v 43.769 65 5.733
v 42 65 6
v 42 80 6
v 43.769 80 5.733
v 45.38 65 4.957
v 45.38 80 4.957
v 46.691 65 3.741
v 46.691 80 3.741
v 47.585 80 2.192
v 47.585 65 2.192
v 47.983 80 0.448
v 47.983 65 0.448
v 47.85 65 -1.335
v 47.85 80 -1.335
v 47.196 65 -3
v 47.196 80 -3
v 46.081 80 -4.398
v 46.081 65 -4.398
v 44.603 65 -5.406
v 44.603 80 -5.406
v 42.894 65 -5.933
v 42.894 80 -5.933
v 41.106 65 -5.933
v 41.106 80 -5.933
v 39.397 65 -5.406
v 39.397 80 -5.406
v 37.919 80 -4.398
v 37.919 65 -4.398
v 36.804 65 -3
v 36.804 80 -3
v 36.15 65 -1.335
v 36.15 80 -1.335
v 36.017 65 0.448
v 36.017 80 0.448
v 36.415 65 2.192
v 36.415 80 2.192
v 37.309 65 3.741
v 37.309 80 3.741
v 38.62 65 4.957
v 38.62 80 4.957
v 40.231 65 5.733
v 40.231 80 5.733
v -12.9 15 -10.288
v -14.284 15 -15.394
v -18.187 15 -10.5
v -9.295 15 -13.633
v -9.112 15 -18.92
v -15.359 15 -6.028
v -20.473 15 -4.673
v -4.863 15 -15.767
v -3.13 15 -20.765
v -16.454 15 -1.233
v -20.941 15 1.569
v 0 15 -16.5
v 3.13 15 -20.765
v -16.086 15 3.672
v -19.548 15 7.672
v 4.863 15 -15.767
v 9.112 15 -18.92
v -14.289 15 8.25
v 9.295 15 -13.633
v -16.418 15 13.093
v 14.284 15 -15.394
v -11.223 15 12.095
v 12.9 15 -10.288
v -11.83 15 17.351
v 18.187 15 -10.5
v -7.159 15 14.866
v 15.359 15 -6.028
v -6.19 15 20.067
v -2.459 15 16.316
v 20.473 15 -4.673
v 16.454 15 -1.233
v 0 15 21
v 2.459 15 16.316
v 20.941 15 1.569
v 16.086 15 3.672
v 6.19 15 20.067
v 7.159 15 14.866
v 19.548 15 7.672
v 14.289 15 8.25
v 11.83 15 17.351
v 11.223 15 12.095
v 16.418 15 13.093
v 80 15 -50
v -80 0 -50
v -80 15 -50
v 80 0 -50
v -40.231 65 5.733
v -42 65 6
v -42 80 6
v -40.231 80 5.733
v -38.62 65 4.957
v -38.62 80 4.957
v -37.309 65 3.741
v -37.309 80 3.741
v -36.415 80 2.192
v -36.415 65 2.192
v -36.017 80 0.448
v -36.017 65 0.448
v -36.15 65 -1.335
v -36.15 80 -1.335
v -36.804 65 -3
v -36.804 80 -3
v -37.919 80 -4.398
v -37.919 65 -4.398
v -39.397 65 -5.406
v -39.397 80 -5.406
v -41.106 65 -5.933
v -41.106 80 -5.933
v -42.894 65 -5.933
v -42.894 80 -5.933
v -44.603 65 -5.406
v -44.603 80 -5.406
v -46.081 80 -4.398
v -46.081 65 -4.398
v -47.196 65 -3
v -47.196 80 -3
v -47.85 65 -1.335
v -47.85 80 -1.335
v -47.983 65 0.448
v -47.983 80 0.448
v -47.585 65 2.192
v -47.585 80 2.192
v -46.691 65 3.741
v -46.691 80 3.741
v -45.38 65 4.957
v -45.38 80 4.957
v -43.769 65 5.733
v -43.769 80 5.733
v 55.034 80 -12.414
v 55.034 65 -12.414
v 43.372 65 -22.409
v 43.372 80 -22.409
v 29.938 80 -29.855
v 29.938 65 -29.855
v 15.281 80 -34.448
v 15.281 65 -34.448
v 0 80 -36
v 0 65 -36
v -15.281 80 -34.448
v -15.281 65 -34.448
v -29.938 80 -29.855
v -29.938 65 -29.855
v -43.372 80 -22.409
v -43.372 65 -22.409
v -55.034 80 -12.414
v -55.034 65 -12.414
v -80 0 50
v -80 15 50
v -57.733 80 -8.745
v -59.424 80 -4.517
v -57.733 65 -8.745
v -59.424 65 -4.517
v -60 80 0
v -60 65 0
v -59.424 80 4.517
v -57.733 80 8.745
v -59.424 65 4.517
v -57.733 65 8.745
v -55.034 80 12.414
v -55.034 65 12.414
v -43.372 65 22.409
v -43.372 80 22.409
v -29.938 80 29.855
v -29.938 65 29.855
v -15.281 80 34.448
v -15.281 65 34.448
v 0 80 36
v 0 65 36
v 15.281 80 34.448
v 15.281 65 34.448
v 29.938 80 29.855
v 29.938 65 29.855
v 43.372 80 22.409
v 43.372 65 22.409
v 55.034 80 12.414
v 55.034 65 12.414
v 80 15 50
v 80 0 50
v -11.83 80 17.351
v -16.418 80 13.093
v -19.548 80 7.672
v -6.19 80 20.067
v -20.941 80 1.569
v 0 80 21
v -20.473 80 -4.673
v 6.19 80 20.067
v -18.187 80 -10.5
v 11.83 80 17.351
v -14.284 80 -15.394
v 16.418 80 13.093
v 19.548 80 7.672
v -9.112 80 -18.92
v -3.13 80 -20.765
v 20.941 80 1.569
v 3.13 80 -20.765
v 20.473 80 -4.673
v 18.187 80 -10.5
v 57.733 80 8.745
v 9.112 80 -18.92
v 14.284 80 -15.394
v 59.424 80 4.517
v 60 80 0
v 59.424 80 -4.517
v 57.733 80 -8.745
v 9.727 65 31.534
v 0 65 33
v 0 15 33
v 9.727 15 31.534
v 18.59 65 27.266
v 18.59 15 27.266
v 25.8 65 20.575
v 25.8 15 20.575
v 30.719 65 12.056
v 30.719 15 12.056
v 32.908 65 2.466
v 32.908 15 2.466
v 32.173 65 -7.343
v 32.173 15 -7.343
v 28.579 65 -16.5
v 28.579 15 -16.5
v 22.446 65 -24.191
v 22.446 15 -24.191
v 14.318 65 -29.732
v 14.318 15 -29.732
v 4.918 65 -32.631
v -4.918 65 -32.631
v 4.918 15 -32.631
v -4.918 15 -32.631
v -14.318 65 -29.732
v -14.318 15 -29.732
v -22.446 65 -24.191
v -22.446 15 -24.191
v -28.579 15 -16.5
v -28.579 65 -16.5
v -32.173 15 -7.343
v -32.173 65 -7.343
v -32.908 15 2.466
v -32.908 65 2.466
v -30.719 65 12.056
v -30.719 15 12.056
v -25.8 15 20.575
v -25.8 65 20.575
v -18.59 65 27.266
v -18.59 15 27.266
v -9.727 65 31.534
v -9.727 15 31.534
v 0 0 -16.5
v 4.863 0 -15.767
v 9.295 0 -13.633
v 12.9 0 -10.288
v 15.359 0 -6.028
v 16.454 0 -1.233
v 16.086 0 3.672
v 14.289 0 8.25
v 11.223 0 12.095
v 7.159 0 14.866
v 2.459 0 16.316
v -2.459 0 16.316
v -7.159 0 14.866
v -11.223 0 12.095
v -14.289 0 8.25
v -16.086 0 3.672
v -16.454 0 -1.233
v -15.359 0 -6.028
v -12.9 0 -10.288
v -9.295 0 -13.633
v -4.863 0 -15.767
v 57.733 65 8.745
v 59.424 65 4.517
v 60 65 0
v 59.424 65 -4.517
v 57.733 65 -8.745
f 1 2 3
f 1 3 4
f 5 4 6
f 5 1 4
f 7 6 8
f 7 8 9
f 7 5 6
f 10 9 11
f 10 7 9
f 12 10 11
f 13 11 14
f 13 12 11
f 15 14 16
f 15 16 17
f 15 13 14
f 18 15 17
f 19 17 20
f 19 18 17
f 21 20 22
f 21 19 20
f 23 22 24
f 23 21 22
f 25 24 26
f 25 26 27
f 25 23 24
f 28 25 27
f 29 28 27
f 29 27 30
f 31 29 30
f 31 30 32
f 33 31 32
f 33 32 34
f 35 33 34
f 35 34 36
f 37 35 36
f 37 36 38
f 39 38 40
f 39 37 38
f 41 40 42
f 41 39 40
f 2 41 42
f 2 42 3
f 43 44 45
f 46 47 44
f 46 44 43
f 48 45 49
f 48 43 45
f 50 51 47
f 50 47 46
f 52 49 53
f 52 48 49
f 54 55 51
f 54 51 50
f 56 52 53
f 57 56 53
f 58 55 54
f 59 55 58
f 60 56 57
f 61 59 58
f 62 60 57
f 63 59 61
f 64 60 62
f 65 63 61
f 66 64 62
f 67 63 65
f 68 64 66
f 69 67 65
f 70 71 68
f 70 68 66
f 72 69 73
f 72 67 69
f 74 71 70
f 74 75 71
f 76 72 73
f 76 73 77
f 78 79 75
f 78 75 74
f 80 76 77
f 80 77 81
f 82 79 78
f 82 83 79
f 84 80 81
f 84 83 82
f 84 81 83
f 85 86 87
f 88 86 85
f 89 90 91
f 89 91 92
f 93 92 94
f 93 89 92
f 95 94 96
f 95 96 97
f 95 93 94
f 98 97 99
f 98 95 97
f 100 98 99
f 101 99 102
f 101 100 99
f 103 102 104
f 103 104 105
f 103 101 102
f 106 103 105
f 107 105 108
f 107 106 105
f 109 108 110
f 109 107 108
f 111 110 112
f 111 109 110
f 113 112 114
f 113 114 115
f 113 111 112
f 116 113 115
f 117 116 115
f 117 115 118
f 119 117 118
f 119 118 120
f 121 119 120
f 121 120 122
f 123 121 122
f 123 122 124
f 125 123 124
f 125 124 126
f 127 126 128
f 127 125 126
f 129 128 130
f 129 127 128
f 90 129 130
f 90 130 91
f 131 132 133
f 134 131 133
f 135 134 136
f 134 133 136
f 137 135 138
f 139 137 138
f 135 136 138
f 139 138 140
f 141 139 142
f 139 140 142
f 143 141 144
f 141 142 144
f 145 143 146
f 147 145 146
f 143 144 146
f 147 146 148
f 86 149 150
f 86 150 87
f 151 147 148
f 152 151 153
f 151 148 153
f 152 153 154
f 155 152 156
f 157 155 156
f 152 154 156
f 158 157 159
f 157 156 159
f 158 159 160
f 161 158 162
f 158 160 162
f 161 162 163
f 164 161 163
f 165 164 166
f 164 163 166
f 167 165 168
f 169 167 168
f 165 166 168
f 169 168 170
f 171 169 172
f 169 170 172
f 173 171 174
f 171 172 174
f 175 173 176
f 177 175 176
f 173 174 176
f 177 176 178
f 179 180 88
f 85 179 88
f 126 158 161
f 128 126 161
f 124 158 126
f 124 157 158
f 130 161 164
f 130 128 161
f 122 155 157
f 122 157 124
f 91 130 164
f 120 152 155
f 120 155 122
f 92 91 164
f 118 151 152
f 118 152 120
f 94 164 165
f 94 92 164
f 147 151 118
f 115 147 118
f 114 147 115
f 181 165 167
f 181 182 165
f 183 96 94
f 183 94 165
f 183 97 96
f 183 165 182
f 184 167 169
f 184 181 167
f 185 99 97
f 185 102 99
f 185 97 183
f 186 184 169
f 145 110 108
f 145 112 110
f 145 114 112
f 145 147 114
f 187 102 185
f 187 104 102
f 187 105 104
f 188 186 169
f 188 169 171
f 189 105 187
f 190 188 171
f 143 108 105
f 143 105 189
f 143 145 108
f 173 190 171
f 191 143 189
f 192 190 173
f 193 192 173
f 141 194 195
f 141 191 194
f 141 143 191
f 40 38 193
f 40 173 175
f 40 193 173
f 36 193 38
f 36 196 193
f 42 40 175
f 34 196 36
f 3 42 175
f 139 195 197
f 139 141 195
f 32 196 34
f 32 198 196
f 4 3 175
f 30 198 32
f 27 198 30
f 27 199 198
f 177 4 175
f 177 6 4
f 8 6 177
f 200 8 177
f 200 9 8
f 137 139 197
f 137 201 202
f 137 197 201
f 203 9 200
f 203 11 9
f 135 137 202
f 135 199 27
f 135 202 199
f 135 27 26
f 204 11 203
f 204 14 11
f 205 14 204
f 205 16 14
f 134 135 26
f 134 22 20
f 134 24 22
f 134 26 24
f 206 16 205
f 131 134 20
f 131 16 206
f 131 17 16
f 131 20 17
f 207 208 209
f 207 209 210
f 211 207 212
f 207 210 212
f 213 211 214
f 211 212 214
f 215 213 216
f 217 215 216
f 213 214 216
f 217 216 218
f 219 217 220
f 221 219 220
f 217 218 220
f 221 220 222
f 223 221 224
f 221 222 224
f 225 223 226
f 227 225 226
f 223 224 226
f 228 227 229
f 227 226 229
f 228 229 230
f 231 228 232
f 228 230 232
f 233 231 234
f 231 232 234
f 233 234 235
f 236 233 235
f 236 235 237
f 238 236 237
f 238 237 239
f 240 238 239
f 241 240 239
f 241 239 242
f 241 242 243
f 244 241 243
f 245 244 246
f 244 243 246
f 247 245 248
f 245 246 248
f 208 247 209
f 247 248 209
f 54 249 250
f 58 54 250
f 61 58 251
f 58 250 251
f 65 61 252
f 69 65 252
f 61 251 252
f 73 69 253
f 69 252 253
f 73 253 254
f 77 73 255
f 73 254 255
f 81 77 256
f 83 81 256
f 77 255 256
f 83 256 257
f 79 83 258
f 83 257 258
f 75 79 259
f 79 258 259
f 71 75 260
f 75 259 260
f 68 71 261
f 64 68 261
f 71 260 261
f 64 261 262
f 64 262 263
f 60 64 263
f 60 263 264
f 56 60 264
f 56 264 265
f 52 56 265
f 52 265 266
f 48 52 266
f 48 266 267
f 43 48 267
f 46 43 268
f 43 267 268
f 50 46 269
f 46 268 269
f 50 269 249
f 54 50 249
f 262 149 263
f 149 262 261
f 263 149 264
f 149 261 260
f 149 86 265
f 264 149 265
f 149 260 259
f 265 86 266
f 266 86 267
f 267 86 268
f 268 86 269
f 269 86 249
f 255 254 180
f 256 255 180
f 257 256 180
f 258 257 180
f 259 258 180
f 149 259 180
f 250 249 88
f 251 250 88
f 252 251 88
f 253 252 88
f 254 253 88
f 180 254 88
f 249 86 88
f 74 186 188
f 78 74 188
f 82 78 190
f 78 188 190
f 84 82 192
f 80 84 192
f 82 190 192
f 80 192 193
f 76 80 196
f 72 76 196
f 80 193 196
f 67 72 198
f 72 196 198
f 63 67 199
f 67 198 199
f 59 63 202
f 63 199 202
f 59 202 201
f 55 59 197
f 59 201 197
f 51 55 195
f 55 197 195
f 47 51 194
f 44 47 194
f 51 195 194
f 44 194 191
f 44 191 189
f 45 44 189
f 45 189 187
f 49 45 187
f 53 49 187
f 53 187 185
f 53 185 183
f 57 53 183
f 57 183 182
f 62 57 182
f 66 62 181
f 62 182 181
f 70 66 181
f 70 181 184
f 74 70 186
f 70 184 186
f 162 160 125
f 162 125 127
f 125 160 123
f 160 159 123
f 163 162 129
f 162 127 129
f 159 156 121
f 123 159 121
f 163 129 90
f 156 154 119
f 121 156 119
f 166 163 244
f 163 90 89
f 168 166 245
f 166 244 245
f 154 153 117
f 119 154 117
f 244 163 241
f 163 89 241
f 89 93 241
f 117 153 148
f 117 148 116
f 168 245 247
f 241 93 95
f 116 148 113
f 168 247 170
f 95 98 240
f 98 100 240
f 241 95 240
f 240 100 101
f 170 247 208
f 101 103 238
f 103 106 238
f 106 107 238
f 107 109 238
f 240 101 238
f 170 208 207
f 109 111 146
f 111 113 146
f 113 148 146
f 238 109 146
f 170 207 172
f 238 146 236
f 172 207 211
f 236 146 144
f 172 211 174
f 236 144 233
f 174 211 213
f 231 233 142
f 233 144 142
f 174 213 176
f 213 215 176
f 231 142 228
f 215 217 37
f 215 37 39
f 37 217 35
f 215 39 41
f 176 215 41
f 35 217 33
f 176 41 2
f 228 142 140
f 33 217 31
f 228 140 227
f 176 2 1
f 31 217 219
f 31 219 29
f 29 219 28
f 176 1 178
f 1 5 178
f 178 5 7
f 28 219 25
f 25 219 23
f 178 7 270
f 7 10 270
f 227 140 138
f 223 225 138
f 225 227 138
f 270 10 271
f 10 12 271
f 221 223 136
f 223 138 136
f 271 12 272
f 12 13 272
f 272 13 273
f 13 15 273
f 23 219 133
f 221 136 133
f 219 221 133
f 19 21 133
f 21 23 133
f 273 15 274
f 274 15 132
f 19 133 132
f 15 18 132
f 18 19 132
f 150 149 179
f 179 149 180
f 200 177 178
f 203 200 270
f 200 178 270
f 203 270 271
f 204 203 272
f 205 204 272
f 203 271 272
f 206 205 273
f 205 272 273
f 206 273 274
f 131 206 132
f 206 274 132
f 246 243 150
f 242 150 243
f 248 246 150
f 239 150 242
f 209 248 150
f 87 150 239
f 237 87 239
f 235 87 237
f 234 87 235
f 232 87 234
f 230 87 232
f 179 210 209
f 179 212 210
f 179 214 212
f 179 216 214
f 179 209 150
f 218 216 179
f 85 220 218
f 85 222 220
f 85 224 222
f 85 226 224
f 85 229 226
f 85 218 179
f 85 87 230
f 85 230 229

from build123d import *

# Parameters (mm, degrees)
SKETCH1_W           = 160
SKETCH1_H           = 100
BOSS_EXTRUDE1_DEPTH = 15
SKETCH3_R           = 16.5
CUT_EXTRUDE1_DEPTH  = 15
SKETCH2_R           = 33
BOSS_EXTRUDE2_DEPTH = 50
SKETCH6_R           = 6
BOSS_EXTRUDE4_DEPTH = 15
SKETCH7_R           = 21
CUT_EXTRUDE3_DEPTH  = 65


with BuildPart() as part:
    # Sketch1 → Boss-Extrude1 (new body)
    with BuildSketch(Plane(origin=(0, 0, 0), x_dir=(1, 0, 0), z_dir=(0, 1, 0))):
        Rectangle(SKETCH1_W, SKETCH1_H)
    extrude(amount=BOSS_EXTRUDE1_DEPTH)

    # Sketch3 → Cut-Extrude1 (cut)
    with BuildSketch(Plane.XZ):
        with Locations(Location((0, 0, 0), (0, 0, 270))):
            Circle(SKETCH3_R)
    extrude(amount=-CUT_EXTRUDE1_DEPTH, mode=Mode.SUBTRACT)

    # Sketch2 → Boss-Extrude2 (add)
    with BuildSketch(Plane(origin=(0, 15, 0), x_dir=(1, 0, 0), z_dir=(0, 1, 0))):
        with Locations(Location((0, 0, 0), (0, 0, 270))):
            Circle(SKETCH2_R)
    extrude(amount=BOSS_EXTRUDE2_DEPTH)

    # Sketch6 → Boss-Extrude4 (add)
    with BuildSketch(Plane(origin=(0, 65, 0), x_dir=(1, 0, 0), z_dir=(0, 1, 0))):
        with BuildLine():
            ThreePointArc((-55.034482759, 12.413793103), (-60, 0), (-55.034482759, -12.413793103))
            ThreePointArc((-55.034482759, -12.413793103), (0, -36), (55.034482759, -12.413793103))
            ThreePointArc((55.034482759, -12.413793103), (60, 0), (55.034482759, 12.413793103))
            ThreePointArc((55.034482759, 12.413793103), (0, 36), (-55.034482759, 12.413793103))
        make_face()
        with Locations(Location((-42, 0, 0), (0, 0, 270))):
            Circle(SKETCH6_R, mode=Mode.SUBTRACT)
        with Locations(Location((42, 0, 0), (0, 0, 270))):
            Circle(SKETCH6_R, mode=Mode.SUBTRACT)
    extrude(amount=BOSS_EXTRUDE4_DEPTH)

    # Sketch7 → Cut-Extrude3 (cut)
    with BuildSketch(Plane(origin=(0, 80, 0), x_dir=(1, 0, 0), z_dir=(0, 1, 0))):
        with Locations(Location((0, 0, 0), (0, 0, 270))):
            Circle(SKETCH7_R)
    extrude(amount=-CUT_EXTRUDE3_DEPTH, mode=Mode.SUBTRACT)


solid = part.part
